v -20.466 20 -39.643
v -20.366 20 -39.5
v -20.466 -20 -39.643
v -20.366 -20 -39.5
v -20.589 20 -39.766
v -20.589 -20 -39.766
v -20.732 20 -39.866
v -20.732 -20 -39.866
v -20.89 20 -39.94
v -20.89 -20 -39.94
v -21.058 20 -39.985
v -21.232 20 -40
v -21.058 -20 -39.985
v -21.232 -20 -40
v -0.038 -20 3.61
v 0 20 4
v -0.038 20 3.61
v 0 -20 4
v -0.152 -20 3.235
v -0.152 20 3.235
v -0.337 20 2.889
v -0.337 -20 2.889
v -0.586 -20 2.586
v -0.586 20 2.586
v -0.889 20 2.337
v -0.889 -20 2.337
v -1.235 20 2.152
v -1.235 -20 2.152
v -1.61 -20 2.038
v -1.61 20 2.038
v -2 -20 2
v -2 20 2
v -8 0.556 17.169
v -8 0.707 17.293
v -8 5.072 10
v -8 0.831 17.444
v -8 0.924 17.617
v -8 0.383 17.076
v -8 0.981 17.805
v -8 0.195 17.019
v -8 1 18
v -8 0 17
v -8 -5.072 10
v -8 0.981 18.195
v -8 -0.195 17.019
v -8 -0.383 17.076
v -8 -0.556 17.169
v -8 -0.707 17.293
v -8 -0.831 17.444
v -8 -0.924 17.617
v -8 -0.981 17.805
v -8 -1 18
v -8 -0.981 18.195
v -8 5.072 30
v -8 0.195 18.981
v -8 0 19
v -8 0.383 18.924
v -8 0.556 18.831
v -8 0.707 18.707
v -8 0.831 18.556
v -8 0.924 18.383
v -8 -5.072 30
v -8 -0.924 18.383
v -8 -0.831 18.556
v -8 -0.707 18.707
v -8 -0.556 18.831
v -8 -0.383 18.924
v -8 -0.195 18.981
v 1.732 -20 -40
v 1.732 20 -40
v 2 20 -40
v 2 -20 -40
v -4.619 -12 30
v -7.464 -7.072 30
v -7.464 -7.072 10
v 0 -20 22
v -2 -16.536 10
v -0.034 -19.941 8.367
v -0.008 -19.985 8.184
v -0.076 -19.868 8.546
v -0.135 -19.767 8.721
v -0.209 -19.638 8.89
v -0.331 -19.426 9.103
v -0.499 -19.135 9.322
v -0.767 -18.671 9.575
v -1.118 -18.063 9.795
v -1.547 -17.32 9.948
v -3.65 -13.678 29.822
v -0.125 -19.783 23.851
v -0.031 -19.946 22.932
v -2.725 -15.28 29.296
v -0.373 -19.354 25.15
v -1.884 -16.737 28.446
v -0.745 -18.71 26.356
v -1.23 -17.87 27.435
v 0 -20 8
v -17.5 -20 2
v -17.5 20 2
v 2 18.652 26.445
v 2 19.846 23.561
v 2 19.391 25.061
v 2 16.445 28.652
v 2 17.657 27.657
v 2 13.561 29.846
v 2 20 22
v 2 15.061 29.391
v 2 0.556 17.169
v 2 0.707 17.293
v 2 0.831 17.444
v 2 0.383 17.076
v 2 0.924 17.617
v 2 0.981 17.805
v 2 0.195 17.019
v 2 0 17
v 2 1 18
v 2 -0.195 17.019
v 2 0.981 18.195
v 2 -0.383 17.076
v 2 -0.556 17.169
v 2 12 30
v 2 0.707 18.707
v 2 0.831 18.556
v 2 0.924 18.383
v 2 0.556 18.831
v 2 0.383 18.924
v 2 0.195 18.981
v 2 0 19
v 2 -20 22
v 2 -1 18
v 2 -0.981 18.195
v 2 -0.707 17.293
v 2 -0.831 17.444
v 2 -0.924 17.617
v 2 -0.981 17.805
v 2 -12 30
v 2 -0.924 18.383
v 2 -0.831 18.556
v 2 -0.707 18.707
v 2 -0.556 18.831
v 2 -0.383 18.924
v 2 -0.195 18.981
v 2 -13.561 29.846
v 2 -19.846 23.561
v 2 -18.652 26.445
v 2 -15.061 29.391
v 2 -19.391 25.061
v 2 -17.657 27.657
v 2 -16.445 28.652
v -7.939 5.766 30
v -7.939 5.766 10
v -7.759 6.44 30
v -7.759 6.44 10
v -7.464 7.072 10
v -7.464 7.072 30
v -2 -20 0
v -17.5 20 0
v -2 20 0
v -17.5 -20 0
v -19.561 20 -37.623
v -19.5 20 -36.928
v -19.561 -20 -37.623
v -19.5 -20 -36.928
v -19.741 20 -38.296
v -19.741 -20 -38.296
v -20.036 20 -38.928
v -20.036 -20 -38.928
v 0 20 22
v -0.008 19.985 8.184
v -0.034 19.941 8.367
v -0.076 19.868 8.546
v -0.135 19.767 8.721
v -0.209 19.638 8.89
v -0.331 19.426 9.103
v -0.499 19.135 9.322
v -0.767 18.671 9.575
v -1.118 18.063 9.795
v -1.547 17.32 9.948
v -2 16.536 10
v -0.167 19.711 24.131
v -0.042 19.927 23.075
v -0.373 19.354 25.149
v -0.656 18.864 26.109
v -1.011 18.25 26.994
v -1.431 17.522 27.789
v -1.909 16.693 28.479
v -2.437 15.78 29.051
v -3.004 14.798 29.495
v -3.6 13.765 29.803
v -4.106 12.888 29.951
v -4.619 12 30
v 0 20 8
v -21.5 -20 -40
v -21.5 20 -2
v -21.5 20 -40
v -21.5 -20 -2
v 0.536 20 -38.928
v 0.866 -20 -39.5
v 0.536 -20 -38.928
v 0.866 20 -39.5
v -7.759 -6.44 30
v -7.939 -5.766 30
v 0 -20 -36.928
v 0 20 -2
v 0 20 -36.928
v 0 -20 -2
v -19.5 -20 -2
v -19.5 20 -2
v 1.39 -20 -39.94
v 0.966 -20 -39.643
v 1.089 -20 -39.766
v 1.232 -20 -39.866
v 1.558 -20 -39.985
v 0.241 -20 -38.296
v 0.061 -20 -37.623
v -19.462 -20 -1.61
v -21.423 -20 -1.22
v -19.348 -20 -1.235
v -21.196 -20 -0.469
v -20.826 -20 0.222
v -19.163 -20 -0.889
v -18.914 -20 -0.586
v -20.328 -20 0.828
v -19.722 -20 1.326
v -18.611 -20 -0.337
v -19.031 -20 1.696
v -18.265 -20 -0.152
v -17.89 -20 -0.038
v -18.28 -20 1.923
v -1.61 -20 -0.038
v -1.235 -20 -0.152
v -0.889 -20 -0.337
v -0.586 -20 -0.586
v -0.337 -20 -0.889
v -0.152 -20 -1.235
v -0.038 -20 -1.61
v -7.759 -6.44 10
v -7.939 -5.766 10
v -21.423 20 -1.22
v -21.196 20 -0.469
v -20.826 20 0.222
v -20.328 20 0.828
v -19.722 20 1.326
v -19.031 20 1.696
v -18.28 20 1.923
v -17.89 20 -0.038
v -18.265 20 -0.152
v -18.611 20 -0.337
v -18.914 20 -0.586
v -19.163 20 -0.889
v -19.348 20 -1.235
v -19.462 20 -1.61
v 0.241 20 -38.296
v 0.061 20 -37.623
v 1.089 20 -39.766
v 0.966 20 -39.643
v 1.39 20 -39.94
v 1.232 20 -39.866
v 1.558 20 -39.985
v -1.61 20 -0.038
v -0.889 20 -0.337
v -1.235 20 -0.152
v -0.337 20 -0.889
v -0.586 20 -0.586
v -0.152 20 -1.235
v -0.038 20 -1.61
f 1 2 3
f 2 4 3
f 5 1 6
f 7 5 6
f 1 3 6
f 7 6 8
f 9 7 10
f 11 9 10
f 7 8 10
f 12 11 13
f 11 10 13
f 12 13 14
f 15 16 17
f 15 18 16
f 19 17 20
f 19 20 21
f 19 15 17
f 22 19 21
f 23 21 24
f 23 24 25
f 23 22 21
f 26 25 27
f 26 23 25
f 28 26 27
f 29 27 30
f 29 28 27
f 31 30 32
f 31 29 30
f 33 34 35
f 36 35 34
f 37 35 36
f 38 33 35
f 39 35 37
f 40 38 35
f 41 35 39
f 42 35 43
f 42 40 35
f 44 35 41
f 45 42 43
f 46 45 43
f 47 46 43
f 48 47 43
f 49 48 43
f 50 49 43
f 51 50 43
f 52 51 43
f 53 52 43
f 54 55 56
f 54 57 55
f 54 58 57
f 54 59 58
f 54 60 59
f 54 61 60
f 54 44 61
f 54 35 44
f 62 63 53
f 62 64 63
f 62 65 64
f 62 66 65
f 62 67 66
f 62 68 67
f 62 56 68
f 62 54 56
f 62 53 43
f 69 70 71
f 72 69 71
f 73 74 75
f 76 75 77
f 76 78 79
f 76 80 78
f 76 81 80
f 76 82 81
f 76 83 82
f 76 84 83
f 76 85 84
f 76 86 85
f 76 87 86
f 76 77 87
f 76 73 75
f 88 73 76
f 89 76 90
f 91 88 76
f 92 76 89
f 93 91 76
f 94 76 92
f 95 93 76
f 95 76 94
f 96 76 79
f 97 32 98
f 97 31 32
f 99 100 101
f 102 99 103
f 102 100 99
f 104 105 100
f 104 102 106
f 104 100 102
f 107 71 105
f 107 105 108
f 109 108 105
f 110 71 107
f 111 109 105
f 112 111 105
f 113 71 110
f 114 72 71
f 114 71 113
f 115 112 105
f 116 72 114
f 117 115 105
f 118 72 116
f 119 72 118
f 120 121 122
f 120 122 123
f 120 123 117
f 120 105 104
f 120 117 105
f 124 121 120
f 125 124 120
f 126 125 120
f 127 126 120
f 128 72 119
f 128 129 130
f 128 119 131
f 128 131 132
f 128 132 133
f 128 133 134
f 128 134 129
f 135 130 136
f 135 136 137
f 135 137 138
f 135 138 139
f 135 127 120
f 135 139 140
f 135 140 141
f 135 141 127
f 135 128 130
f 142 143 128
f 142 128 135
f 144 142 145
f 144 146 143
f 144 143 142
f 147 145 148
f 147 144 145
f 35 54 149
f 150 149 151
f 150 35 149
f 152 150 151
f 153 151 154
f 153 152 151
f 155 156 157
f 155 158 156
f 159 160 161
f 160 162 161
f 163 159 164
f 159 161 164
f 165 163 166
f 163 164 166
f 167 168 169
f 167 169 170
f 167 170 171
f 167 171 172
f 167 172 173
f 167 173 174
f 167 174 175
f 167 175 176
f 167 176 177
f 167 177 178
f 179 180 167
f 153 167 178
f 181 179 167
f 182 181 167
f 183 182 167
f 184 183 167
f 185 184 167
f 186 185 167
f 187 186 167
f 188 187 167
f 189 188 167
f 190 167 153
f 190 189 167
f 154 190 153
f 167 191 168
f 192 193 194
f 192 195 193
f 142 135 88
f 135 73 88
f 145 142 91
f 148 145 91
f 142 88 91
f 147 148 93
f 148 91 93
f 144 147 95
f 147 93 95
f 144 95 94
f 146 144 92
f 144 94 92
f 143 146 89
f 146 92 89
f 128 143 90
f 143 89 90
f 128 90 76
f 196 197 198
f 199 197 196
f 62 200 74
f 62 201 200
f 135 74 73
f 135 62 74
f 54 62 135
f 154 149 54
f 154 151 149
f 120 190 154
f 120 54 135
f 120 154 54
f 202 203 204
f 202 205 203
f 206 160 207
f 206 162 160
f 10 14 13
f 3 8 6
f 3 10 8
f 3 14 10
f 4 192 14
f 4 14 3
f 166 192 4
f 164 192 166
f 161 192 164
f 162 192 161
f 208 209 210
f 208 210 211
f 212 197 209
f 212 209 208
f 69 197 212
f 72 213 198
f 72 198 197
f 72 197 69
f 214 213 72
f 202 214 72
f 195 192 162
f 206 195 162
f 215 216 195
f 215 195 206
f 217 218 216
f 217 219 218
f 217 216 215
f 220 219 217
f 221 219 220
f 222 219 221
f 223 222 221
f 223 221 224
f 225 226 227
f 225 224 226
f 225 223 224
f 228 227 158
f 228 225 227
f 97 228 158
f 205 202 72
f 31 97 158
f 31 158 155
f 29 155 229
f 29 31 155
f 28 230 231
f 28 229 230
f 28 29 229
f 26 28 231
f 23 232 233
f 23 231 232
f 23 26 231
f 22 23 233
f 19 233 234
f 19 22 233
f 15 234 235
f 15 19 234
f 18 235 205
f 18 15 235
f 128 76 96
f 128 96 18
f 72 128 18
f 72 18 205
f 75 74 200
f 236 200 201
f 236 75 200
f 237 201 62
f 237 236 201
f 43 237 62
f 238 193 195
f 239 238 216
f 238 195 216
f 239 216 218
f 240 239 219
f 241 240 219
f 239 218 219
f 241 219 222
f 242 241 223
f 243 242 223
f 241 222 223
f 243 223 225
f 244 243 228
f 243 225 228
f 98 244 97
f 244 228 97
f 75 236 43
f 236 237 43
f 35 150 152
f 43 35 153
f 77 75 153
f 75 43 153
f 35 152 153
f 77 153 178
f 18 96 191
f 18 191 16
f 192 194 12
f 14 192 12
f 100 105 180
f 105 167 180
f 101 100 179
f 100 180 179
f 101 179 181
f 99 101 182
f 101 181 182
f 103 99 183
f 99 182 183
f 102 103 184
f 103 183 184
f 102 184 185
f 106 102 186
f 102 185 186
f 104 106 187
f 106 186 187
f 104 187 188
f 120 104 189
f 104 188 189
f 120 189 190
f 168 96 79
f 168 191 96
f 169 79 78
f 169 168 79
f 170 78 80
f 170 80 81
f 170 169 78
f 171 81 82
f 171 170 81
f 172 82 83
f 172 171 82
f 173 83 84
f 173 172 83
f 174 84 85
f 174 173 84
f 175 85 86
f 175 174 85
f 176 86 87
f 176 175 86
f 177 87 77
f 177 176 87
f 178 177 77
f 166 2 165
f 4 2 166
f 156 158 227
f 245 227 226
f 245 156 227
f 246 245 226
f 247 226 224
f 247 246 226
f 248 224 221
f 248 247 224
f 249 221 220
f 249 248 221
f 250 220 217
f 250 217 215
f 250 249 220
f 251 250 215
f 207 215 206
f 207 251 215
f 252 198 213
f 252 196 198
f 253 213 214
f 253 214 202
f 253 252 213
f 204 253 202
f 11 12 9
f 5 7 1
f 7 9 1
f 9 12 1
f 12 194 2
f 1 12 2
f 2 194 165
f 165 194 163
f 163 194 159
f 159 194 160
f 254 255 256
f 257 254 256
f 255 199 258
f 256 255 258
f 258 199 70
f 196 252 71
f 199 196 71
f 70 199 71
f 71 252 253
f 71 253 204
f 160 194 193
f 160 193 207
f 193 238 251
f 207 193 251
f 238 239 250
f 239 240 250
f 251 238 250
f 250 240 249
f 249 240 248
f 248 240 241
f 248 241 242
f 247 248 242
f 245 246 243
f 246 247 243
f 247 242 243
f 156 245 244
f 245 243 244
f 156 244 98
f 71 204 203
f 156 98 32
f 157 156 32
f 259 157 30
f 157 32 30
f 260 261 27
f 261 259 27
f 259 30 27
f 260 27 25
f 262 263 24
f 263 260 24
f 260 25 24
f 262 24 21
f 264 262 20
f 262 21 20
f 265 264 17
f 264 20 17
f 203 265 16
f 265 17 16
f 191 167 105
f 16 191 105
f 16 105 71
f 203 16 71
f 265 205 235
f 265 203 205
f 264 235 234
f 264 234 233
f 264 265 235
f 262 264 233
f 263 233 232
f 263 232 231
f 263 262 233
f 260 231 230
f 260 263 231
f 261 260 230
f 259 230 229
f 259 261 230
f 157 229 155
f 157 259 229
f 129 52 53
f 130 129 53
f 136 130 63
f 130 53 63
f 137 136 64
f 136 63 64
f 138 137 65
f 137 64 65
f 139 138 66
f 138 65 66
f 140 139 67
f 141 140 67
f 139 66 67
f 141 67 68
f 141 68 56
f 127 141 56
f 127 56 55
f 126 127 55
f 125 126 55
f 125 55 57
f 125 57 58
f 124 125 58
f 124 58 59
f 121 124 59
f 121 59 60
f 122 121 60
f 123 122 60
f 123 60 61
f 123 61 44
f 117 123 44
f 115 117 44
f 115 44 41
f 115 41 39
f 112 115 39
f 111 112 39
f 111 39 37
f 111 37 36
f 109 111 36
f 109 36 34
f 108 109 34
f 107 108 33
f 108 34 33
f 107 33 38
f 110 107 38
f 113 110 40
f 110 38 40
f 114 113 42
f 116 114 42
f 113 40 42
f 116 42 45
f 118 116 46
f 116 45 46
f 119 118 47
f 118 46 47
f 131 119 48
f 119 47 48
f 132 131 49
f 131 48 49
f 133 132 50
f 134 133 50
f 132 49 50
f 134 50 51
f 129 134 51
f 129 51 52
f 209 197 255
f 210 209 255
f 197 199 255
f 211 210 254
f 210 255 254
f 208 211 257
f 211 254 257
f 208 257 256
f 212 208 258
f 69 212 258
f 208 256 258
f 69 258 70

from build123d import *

# Parameters (mm, degrees)
F1_DEPTH = 20
F3_DEPTH = 20
F5_D     = 2
F6_SIZE2 = 1.1547005384
F6_SIZE  = 2
F7_SIZE2 = 1.1547005384
F7_SIZE  = 2
F8_R     = 1
F9_R     = 2
F10_R    = 4
F11_R    = 8


with BuildPart() as f1:
    # F0 (on Front) → F1 (new body, symmetric)
    with BuildSketch(Plane.XZ):
        Polygon((0, 2), (0, 0), (0, -40), (2, -40), (2, 30), (0, 30), align=None)
        Polygon((-19.5, -40), (-19.5, 0), (0, 0), (0, 2), (-21.5, 2), (-21.5, -40), align=None)
    extrude(amount=F1_DEPTH, both=True)

    # F2 (on face) → F3 (join)
    with BuildSketch(Plane.XY.offset(30)):
        Polygon((0, -20), (0, 20), (-8, 6.1435935394), (-8, -6.1435935394), align=None)
    extrude(amount=-F3_DEPTH)

    # F5 (through all)
    with Locations(Plane.YZ.offset(2)):
        with Locations((0, 18)):
            Hole(F5_D / 2)

    # F6
    f6_edges = [f1.edges().sort_by_distance(p)[0] for p in [
        (-19.5, 0, -40),
    ]]
    f6_side = f1.faces().sort_by_distance((-19.5, 0, -20))[0]
    chamfer(f6_edges, length=F6_SIZE, length2=F6_SIZE2, reference=f6_side)

    # F7
    f7_edges = [f1.edges().sort_by_distance(p)[0] for p in [
        (0, 0, -40),
    ]]
    f7_side = f1.faces().sort_by_distance((0, 0, -20))[0]
    chamfer(f7_edges, length=F7_SIZE, length2=F7_SIZE2, reference=f7_side)

    # F8
    f8_edges = [f1.edges().sort_by_distance(p)[0] for p in [
        (-20.654701, 0, -40),
        (1.154701, 0, -40),
    ]]
    fillet(f8_edges, radius=F8_R)

    # F9
    f9_edges = [f1.edges().sort_by_distance(p)[0] for p in [
        (0, 0, 2),
        (-19.5, 0, 0),
        (0, 0, 0),
        (0, 0, 10),
    ]]
    fillet(f9_edges, radius=F9_R)

    # F10
    f10_edges = [f1.edges().sort_by_distance(p)[0] for p in [
        (-21.5, 0, 2),
        (-8, -6.143594, 20),
        (-8, 6.143594, 20),
        (-19.5, 0, -38),
        (0, 0, -38),
    ]]
    fillet(f10_edges, radius=F10_R)

    # F11
    f11_edges = [f1.edges().sort_by_distance(p)[0] for p in [
        (1, -20, 30),
        (1, 20, 30),
    ]]
    fillet(f11_edges, radius=F11_R)


solid = f1.part
